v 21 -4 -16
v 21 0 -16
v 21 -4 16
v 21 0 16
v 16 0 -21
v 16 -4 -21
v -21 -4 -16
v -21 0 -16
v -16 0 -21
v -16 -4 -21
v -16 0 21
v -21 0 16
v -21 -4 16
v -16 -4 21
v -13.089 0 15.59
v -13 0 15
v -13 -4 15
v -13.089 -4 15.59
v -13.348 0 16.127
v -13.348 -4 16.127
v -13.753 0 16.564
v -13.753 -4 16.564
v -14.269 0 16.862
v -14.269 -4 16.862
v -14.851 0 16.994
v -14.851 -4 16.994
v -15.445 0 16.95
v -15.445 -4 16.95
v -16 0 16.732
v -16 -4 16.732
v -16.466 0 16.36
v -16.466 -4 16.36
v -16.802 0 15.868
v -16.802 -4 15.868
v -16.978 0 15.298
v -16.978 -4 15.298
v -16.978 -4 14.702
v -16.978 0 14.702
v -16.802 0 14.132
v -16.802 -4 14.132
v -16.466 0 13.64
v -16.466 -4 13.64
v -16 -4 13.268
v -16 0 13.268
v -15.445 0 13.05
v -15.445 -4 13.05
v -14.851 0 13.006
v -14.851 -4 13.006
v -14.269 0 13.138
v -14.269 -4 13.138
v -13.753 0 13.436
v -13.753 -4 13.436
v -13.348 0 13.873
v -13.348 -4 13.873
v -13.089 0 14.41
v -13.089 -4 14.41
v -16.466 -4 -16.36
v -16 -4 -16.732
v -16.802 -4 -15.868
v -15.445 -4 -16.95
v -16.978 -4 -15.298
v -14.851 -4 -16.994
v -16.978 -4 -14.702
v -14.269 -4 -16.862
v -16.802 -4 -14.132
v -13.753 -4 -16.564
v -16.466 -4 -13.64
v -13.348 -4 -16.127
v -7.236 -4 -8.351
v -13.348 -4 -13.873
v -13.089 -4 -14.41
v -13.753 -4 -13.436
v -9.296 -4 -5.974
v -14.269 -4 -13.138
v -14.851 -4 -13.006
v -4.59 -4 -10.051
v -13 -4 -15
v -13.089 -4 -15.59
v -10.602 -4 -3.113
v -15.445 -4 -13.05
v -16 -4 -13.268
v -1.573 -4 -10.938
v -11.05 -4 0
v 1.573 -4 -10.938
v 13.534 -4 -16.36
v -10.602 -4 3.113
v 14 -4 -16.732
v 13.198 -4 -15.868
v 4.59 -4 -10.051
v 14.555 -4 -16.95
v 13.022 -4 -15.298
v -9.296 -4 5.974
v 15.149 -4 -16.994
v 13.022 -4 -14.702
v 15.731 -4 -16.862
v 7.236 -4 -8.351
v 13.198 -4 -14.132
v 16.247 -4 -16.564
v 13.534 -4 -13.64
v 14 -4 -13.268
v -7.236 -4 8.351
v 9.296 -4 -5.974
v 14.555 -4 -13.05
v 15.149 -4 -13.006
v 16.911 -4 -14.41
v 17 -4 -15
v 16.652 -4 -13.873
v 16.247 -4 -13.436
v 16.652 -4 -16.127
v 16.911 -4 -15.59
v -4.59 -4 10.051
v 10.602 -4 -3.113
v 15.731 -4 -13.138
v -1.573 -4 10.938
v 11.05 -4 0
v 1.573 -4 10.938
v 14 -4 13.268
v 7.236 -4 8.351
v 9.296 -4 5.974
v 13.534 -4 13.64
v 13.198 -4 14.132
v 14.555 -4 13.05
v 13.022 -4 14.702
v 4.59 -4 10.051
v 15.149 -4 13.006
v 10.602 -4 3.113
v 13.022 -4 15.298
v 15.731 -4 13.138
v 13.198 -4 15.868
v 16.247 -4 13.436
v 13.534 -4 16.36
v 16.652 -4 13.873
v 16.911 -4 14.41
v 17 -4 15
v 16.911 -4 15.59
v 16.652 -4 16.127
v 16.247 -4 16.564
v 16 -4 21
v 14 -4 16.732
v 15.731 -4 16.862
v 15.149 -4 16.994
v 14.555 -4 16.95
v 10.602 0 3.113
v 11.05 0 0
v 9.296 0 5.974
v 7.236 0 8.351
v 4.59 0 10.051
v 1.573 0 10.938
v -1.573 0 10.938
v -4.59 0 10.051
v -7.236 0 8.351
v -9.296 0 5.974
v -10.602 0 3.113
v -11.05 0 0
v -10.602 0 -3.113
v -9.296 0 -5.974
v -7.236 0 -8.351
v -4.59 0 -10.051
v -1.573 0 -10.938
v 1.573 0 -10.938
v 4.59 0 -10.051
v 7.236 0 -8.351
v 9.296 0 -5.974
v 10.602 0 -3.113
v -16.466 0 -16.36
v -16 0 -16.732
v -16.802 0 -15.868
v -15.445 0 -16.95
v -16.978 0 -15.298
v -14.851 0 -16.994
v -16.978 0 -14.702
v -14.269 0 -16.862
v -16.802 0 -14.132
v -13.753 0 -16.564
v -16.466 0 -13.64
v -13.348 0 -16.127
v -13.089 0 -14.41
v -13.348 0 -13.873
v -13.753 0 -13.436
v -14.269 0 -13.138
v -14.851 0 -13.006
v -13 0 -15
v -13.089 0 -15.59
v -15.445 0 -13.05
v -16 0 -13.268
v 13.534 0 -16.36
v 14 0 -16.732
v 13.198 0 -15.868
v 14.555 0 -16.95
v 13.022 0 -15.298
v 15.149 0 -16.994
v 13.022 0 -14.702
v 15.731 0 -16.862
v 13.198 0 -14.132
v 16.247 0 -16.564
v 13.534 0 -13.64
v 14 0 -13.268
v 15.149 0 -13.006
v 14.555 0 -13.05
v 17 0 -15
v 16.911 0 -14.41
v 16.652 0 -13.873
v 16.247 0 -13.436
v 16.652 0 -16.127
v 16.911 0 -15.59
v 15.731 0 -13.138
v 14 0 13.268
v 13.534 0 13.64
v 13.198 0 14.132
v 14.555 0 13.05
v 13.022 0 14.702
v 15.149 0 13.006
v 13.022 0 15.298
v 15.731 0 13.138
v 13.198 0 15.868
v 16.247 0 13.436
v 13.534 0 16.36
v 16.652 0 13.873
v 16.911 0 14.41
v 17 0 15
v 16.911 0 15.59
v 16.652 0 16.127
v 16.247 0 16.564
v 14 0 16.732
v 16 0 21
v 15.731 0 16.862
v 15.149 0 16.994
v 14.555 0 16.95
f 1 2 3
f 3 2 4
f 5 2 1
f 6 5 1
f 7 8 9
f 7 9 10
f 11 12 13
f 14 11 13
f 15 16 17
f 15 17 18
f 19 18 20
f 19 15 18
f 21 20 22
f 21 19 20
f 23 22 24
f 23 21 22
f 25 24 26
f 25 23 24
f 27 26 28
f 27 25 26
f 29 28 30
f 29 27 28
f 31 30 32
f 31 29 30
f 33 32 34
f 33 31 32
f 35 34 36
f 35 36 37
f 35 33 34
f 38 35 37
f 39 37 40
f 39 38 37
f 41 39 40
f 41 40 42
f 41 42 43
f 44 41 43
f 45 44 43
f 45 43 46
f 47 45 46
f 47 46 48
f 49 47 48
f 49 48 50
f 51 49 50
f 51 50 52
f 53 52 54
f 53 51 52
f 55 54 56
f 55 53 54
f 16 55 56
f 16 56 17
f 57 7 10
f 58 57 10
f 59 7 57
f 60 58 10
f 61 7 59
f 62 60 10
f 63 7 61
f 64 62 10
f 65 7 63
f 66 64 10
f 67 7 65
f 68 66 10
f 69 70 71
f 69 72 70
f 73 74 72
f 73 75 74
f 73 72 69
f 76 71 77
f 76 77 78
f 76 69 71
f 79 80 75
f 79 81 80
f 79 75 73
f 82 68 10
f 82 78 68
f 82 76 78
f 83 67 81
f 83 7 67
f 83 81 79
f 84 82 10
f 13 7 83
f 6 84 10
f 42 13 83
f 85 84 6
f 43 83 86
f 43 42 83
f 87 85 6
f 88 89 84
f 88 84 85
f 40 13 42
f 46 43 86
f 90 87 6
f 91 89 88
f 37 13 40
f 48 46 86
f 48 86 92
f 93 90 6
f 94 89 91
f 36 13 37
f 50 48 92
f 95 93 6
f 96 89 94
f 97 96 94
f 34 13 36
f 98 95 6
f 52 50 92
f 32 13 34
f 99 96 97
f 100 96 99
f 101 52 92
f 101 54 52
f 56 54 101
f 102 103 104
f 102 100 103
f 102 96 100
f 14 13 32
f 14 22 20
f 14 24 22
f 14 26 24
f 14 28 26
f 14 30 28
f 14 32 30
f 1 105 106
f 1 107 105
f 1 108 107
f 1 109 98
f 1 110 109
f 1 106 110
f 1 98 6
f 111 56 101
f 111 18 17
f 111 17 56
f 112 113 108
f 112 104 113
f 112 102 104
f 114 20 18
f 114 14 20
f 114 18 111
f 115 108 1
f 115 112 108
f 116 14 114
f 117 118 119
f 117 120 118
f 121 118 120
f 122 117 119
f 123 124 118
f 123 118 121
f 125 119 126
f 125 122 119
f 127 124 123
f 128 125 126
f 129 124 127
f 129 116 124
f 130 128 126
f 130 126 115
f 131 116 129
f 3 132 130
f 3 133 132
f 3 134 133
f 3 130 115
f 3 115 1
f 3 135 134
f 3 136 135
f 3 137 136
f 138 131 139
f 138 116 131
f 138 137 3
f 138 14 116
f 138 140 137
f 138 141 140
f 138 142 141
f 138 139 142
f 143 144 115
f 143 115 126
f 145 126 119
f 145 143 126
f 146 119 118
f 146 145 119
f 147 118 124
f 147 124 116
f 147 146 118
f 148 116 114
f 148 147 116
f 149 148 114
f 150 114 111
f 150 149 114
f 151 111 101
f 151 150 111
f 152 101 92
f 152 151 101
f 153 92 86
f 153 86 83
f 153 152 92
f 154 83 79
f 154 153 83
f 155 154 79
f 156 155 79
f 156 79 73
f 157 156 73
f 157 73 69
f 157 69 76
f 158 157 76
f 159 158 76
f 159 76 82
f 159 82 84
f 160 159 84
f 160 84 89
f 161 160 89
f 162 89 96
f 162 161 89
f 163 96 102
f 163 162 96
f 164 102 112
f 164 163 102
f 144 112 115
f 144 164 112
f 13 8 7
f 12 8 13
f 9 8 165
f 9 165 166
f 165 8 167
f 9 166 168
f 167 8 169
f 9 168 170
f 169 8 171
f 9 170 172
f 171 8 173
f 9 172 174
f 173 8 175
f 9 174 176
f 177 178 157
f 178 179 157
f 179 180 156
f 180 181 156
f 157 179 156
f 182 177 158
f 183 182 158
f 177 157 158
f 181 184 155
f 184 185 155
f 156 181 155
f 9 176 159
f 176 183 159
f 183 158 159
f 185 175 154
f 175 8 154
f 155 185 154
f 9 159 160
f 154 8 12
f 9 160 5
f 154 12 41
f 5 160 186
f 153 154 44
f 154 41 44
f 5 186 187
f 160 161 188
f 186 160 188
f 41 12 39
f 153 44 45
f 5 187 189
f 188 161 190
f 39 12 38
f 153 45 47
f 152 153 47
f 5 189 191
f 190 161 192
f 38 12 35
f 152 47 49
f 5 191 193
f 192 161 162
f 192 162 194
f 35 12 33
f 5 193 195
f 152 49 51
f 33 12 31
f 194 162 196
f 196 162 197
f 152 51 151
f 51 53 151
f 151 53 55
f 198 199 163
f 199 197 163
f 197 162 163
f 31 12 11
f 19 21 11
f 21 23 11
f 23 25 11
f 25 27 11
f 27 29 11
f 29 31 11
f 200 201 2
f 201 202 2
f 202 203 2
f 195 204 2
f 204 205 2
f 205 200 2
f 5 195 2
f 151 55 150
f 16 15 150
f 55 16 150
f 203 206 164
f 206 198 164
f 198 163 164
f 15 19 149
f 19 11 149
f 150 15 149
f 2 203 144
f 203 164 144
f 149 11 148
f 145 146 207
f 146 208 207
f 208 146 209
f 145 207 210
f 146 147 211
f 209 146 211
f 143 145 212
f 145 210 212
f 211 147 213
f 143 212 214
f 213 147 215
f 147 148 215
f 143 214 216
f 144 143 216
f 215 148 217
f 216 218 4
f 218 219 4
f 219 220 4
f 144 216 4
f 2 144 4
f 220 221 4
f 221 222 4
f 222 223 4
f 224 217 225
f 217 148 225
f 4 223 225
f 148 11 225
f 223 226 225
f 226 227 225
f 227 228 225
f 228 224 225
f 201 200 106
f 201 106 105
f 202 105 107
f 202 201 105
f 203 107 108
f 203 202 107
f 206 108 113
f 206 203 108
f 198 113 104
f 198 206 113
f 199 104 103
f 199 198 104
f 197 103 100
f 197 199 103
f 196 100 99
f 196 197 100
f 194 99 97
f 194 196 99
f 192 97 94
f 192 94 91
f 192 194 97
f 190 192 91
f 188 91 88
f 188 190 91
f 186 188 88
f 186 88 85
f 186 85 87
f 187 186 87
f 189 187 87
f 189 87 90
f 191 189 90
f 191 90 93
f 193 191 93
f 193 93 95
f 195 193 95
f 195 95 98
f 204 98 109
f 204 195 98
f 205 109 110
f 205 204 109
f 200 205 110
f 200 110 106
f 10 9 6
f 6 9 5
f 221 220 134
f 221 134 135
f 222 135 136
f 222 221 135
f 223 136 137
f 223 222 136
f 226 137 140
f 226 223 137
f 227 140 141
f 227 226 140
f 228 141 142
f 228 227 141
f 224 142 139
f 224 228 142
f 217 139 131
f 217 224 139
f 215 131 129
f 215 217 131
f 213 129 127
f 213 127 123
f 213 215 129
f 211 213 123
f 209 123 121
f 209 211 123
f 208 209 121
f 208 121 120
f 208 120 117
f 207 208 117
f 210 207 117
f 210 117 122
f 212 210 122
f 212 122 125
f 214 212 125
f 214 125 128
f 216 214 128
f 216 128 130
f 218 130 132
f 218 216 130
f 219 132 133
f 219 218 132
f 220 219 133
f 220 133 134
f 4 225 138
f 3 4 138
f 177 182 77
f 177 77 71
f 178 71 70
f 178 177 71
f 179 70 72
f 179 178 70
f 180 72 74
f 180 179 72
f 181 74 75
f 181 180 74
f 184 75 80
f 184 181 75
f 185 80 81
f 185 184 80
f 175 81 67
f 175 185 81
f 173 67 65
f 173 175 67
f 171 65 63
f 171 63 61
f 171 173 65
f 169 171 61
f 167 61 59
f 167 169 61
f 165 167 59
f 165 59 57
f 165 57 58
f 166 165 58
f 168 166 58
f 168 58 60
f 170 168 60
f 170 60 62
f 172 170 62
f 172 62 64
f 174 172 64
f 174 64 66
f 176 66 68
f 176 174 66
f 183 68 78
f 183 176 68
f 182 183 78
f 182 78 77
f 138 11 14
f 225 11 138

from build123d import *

# Parameters (mm, degrees)
F0_W     = 42
F0_H     = 42
F0_R     = 2
F0_R_2   = 11.05
F1_DEPTH = 4
F2_SIZE  = 5
F3_SIZE  = 5
F4_SIZE  = 5
F5_SIZE  = 5


with BuildPart() as f1:
    # F0 (on Front) → F1 (new body)
    with BuildSketch(Plane.XZ):
        Rectangle(F0_W, F0_H)
        with Locations((-15, -15)):
            Circle(F0_R, mode=Mode.SUBTRACT)
        with Locations((15, -15)):
            Circle(F0_R, mode=Mode.SUBTRACT)
        with Locations((-15, 15)):
            Circle(F0_R, mode=Mode.SUBTRACT)
        Circle(F0_R_2, mode=Mode.SUBTRACT)
        with Locations((15, 15)):
            Circle(F0_R, mode=Mode.SUBTRACT)
    extrude(amount=F1_DEPTH)

    # F2
    f2_edges = [f1.edges().sort_by_distance(p)[0] for p in [
        (-21, -2, -21),
    ]]
    chamfer(f2_edges, length=F2_SIZE)

    # F3
    f3_edges = [f1.edges().sort_by_distance(p)[0] for p in [
        (-21, -2, 21),
    ]]
    chamfer(f3_edges, length=F3_SIZE)

    # F4
    f4_edges = [f1.edges().sort_by_distance(p)[0] for p in [
        (21, -2, 21),
    ]]
    chamfer(f4_edges, length=F4_SIZE)

    # F5
    f5_edges = [f1.edges().sort_by_distance(p)[0] for p in [
        (21, -2, -21),
    ]]
    chamfer(f5_edges, length=F5_SIZE)


solid = f1.part
